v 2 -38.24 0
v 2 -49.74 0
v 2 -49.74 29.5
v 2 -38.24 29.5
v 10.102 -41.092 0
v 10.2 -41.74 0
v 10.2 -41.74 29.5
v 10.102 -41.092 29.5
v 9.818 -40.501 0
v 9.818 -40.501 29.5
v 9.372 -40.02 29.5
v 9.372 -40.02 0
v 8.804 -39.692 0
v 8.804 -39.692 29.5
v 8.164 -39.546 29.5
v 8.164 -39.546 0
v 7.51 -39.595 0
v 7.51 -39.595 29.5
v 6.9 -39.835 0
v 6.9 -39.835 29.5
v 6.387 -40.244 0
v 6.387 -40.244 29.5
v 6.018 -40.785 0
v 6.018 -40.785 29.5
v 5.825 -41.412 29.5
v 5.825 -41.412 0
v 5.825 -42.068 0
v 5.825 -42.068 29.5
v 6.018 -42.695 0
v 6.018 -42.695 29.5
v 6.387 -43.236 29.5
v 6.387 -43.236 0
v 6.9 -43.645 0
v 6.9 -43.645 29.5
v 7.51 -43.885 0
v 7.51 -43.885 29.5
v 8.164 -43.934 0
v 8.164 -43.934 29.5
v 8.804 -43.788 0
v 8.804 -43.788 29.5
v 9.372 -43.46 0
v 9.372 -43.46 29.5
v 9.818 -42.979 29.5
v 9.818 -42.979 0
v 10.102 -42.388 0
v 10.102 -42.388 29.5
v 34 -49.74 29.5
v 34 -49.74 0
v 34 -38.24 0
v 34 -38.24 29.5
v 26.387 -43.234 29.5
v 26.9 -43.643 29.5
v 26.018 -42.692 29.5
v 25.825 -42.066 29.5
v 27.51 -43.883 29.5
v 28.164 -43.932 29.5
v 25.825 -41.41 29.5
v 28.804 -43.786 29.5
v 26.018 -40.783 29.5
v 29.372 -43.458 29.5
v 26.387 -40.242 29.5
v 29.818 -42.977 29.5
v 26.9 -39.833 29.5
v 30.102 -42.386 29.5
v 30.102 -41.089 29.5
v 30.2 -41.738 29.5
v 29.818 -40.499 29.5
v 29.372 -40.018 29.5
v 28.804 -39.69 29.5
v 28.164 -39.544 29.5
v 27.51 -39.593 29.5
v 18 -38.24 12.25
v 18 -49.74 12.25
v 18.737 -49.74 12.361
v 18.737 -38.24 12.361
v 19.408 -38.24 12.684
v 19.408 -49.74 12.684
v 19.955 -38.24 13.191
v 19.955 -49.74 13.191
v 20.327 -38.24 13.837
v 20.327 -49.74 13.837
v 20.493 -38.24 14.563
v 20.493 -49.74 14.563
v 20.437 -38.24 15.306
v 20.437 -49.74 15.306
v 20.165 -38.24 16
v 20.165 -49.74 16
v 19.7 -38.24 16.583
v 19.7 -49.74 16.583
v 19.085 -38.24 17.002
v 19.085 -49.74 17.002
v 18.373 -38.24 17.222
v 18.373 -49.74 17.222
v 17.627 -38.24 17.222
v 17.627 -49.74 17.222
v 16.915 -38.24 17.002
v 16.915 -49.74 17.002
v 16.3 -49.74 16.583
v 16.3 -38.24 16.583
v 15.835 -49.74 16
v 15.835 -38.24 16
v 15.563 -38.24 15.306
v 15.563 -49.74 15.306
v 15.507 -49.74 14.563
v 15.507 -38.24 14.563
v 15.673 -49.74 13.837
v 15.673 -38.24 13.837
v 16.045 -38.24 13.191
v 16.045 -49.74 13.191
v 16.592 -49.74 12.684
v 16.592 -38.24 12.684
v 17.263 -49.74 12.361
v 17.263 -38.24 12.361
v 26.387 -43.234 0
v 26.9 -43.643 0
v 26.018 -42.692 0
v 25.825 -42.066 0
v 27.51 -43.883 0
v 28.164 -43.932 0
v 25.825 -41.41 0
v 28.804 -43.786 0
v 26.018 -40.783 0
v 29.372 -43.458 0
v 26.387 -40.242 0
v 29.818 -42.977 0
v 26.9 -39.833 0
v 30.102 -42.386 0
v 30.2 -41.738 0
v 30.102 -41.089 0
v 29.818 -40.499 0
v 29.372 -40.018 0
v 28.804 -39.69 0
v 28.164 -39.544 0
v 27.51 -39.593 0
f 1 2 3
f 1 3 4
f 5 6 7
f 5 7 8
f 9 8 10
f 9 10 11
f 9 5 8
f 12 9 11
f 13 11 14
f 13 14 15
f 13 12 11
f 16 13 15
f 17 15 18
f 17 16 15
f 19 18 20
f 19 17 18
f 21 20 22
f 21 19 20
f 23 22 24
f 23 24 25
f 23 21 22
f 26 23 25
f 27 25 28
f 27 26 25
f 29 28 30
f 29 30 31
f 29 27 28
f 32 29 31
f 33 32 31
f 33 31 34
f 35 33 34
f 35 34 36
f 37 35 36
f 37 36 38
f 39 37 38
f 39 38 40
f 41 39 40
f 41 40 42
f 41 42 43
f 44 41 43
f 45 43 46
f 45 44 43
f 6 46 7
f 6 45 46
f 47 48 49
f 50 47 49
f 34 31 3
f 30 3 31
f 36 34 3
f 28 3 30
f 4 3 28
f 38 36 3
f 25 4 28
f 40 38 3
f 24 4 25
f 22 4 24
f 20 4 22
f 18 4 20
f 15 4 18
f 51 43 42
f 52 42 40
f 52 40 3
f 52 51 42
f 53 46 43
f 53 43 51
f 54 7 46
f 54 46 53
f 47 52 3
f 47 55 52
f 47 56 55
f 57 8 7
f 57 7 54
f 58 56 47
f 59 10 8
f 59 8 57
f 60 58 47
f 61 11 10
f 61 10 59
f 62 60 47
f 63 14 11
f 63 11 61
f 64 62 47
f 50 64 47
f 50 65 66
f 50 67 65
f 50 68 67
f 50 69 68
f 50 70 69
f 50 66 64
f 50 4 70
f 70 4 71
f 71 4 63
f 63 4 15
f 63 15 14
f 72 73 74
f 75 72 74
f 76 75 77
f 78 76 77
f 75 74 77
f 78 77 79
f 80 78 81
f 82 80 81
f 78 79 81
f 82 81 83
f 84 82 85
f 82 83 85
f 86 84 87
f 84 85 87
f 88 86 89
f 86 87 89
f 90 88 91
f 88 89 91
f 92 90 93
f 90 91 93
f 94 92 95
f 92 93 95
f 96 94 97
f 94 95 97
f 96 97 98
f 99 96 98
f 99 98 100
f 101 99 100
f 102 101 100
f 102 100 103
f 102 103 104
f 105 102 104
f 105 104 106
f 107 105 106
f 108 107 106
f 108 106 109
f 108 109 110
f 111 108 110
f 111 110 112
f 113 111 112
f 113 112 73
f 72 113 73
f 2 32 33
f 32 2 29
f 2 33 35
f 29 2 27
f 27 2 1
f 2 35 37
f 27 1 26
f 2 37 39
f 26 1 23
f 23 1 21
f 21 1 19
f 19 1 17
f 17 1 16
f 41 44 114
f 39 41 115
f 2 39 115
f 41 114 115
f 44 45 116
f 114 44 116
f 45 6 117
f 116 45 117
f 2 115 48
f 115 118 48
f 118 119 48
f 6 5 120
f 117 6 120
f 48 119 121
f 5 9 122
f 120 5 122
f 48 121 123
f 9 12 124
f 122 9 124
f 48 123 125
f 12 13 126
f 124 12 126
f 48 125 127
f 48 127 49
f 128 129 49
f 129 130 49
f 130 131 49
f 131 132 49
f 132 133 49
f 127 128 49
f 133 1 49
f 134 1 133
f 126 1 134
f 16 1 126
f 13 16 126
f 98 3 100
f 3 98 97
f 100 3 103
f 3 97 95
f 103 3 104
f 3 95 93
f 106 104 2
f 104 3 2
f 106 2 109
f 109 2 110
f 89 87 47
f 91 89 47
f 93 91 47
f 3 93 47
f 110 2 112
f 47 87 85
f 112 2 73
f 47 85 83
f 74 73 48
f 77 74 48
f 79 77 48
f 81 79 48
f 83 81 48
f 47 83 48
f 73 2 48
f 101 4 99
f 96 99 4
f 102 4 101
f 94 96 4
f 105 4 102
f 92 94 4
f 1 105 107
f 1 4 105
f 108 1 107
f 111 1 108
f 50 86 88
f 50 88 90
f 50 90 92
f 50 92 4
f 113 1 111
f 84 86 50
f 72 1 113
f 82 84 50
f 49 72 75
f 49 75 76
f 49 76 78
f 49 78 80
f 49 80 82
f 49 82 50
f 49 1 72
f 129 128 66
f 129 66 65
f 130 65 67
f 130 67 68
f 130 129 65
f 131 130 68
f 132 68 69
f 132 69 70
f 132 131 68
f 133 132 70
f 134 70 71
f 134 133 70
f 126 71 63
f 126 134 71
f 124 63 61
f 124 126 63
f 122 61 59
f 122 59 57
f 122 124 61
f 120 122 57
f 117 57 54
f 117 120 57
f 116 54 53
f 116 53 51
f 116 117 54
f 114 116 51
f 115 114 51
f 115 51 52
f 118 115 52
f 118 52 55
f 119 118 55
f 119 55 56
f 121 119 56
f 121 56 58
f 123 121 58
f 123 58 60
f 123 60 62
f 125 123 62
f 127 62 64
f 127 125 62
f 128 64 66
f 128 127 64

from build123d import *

# Parameters (mm, degrees)
SKETCH_1_W          = 31.99999989
SKETCH_1_H          = 11.5
SKETCH_1_R          = 2.2
EXTRUDE_1_DEPTH     = 29.5
SKETCH_2_R          = 2.5
CUT_EXTRUDE_1_DEPTH = 29.5


with BuildPart() as part:
    # 草图1 → 凸台-拉伸1 (new body)
    with BuildSketch(Plane.XY):
        with Locations((17.999999945, -43.99)):
            Rectangle(SKETCH_1_W, SKETCH_1_H)
        with Locations((8, -41.74)):
            Circle(SKETCH_1_R, mode=Mode.SUBTRACT)
        with Locations((27.99999989, -41.737899898)):
            Circle(SKETCH_1_R, mode=Mode.SUBTRACT)
    extrude(amount=EXTRUDE_1_DEPTH)

    # 草图2 → 切除-拉伸1 (cut)
    with BuildSketch(Plane.XZ.offset(49.74)):
        with Locations(Location((17.999999945, 14.75, 0), (0, 0, 270))):
            Circle(SKETCH_2_R)
    extrude(amount=-CUT_EXTRUDE_1_DEPTH, mode=Mode.SUBTRACT)


solid = part.part
